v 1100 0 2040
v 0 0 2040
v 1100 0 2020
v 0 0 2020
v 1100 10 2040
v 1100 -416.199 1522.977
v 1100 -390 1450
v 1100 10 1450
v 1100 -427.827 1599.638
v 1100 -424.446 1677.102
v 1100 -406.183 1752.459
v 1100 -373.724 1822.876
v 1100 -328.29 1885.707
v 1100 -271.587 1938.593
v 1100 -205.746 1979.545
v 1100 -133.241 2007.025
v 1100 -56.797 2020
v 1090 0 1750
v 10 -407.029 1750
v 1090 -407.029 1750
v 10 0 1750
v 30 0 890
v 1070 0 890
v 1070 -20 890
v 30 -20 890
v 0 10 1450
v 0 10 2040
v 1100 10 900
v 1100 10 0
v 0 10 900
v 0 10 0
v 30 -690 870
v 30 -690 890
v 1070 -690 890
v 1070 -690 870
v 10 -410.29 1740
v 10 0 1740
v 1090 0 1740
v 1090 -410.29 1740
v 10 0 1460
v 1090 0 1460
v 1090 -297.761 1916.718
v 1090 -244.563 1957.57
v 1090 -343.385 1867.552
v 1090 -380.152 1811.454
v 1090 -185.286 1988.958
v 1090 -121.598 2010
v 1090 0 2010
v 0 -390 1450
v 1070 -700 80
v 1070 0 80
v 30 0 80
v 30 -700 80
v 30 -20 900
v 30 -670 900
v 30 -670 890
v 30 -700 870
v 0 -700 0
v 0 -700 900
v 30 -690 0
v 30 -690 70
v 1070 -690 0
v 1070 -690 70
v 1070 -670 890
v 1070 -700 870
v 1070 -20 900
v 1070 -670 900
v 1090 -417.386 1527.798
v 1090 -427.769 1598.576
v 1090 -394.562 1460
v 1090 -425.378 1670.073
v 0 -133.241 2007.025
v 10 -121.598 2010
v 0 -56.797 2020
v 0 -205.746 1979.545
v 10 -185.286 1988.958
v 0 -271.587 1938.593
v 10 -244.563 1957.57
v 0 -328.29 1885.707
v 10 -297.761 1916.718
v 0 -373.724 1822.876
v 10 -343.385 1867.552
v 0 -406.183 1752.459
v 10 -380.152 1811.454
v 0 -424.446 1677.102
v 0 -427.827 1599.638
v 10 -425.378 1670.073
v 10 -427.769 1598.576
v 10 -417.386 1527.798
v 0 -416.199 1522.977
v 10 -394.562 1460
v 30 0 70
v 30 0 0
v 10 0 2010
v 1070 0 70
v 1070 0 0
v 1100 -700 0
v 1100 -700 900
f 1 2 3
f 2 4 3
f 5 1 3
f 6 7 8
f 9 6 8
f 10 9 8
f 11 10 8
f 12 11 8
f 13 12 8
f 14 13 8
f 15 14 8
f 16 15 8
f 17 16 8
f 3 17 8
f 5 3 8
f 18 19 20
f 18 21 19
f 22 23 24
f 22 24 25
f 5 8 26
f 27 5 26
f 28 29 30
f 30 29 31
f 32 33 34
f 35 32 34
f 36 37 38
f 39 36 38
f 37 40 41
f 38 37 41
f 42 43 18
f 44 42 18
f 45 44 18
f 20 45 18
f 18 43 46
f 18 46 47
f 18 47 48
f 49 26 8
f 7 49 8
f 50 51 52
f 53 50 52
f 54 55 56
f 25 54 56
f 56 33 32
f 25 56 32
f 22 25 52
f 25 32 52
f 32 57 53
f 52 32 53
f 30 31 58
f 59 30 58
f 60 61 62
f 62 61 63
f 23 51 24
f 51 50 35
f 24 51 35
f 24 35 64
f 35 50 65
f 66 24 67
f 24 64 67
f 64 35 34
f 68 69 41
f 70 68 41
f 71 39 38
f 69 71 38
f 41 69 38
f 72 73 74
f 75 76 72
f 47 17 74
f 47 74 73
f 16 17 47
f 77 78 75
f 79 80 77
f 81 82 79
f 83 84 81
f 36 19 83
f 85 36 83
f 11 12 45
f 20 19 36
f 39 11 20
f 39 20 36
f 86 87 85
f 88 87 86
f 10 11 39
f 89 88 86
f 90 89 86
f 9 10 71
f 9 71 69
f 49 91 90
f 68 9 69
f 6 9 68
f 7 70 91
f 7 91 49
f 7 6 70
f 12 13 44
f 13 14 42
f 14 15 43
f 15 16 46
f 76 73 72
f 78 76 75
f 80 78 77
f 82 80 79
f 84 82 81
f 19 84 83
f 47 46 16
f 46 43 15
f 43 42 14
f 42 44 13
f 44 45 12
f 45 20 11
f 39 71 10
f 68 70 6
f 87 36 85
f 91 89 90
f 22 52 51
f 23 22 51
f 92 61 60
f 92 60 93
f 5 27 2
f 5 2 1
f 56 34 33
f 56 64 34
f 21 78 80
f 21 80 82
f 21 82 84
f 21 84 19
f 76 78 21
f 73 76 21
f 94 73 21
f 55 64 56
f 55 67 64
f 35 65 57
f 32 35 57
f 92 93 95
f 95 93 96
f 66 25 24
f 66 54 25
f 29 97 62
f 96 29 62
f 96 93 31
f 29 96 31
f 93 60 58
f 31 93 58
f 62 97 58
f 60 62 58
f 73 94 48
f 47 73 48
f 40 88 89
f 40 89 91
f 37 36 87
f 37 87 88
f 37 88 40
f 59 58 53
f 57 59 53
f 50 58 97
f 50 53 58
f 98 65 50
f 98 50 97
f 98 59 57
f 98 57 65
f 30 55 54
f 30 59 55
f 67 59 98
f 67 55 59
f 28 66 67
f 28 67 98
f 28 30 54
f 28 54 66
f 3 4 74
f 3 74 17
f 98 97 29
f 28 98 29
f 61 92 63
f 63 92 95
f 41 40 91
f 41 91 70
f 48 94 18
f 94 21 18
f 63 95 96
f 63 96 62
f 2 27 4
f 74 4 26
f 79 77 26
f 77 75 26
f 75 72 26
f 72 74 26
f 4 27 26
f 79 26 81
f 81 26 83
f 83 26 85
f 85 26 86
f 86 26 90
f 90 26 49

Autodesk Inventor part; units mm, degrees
sketch "Sketch1" plane through (0, 0, 0) normal (0, 0, 1) x (1, 0, 0)
  line L0 (0, 0) -> (1100, 0)
  line L1 (1100, 0) -> (1100, 10)
  line L2 (1100, 10) -> (0, 10)
  line L3 (0, 10) -> (0, 0)
  dimension "ancho" = 1100
  dimension "espesor" = 10
extrude "Extrusion1" add sketch "Sketch1" along normal blind 900
sketch "Sketch2" plane through (0, 0, 0) normal (0, -1, 0) x (1, 0, 0)
  line L0 (0, 0) -> (1100, 0) construction
  line L1 (1100, 0) -> (1100, 900) construction
  line L2 (0, 900) -> (1100, 900) construction
  line L3 (0, 0) -> (0, 900) construction
  line L4 (0, 0) -> (0, 900) projected
  line L5 (0, 70) -> (1100, 70)
  line L6 (1100, 70) -> (1100, 80)
  line L7 (1100, 80) -> (0, 80)
  line L8 (0, 80) -> (0, 70)
  line L9 (0, 900) -> (1100, 900) projected
  line L10 (1100, 0) -> (1100, 900) projected
  line L11 (0, 900) -> (1100, 900)
  line L12 (1100, 900) -> (1100, 890)
  line L13 (1100, 890) -> (0, 890)
  line L14 (0, 890) -> (0, 900)
  dimension "d5" = 10
  dimension "d6" = 10
  dimension "d7" = 80
extrude "Extrusion2" add sketch "Sketch2" along normal blind 700 contours L4 L7 L6 L5 | L4 L9 L10 L13
sketch "Sketch3" plane through (0, 0, 900) normal (0, 0, 1) x (1, 0, 0)
  line L0 (1100, 10) -> (1100, -700) projected
  line L1 (1100, 10) -> (0, 10) projected
  line L2 (0, 10) -> (0, -700) projected
  line L3 (1100, -700) -> (0, -700) projected
  line L4 (30, -670) -> (30, -20)
  line L5 (30, -20) -> (1070, -20)
  line L6 (1070, -20) -> (1070, -670)
  line L7 (1070, -670) -> (30, -670)
  point P0 (0, 0)
  dimension "d10" = 30
extrude "Extrusion3" cut sketch "Sketch3" against normal up to next contours L4 L5 L6 L7
sketch "Sketch4" plane through (0, -700, 0) normal (0, -1, 0) x (1, 0, 0)
  line L0 (0, 70) -> (1100, 70) construction
  line L1 (1100, 70) -> (1100, 80) construction
  line L2 (1100, 80) -> (0, 80) construction
  line L3 (0, 80) -> (0, 70) construction
  line L4 (0, 900) -> (0, 890) construction
  line L5 (0, 890) -> (1100, 890) construction
  line L6 (1100, 890) -> (1100, 900) construction
  line L7 (1100, 900) -> (0, 900) construction
  line L8 (1100, 70) -> (0, 70) construction
  line L9 (0, 0) -> (0, 70) construction
  line L10 (0, 0) -> (1100, 0) construction
  line L11 (1100, 0) -> (1100, 70) construction
  line L12 (0, 900) -> (1100, 900)
  line L13 (1100, 900) -> (1100, 0)
  line L14 (1100, 0) -> (0, 0)
  line L15 (0, 0) -> (0, 900)
  line L16 (1100, 80) -> (0, 80) projected
  line L17 (30, 80) -> (1070, 80)
  line L18 (1070, 80) -> (1070, 890)
  line L19 (1070, 890) -> (30, 890)
  line L20 (30, 890) -> (30, 80)
  dimension "d13" = 30
  dimension "d14" = 30
extrude "Extrusion4" add sketch "Sketch4" against normal blind 10 contours L12 L13 L16 L18 L19 L20 L15 | L16 L13 L14 L15
ref_plane "Work Plane1" through (0, 0, 1450) normal (0, 0, 1) x (1, 0, 0)
sketch "Sketch5" plane through (0, 0, 1450) normal (0, 0, 1) x (1, 0, 0)
  line L0 (1100, 10) -> (0, 10) projected
  line L1 (0, 10) -> (0, -700) projected
  line L2 (1100, 10) -> (1100, -700) projected
  line L3 (1100, -700) -> (0, -700) projected
  point P0 (0, 0)
extrude "Extrusion5" add sketch "Sketch5" along normal blind 10
sketch "Sketch6" plane through (0, 0, 1460) normal (0, 0, 1) x (1, 0, 0)
  line L0 (1100, 10) -> (0, 10) projected
  line L1 (0, 10) -> (0, -700) projected
  line L2 (0, -700) -> (1100, -700) projected
  line L3 (1100, -700) -> (1100, 10) projected
  line L4 (1100, -700) -> (0, -700) projected
  line L5 (1100, 0) -> (1100, -690) projected
  line L6 (0, -700) -> (1100, -700)
  line L7 (1100, -700) -> (1100, -690)
  line L8 (1100, -690) -> (0, -690)
  line L9 (0, -690) -> (0, -700)
  line L10 (0, 0) -> (0, -690) projected
  line L11 (1100, 10) -> (0, 10)
  line L12 (0, 10) -> (0, 0)
  line L13 (0, 0) -> (1100, 0)
  line L14 (1100, 0) -> (1100, 10)
  dimension "d20" = 10
  dimension "d21" = 10
extrude "Extrusion6" add sketch "Sketch6" along normal blind 580 contours L3 L13 L1 L0 | L3 L2 L1 L8
sketch "Sketch7" plane through (0, -700, 1450) normal (0, -1, 0) x (1, 0, 0)
  line L0 (1100, 0) -> (1100, 590) projected
  line L1 (0, 590) -> (1100, 590) projected
  line L2 (0, 0) -> (0, 590) projected
  line L3 (0, 10) -> (1100, 10) projected
  line L4 (30, 10) -> (1070, 10)
  line L5 (1070, 10) -> (1070, 560)
  line L6 (1070, 560) -> (30, 560)
  line L7 (30, 560) -> (30, 10)
  line L8 (0, 0) -> (1100, 0) projected
  point P0 (0, -1450)
  dimension "d24" = 30
  dimension "d25" = 30
  dimension "d26" = 30
extrude "Extrusion7" cut sketch "Sketch7" against normal up to next contours L3 L7 L6 L5
sketch "Sketch9" plane through (0, -700, 0) normal (0, -1, 0) x (1, 0, 0)
  line L0 (0, 900) -> (0, 0) construction
  line L1 (1100, 900) -> (1100, 0) construction
  line L2 (1100, 890) -> (1100, 80) projected
  line L3 (0, 900) -> (1100, 900)
  line L4 (1100, 900) -> (1100, 870)
  line L5 (1100, 870) -> (0, 870)
  line L6 (0, 870) -> (0, 900)
  line L7 (1100, 0) -> (0, 0) projected
  line L8 (1100, 900) -> (0, 900) projected
extrude "Extrusion9" add sketch "Sketch9" against normal blind 10
ref_plane "Work Plane2" through (0, 0, 1740) normal (0, 0, 1) x (1, 0, 0)
sketch "Sketch12" plane through (0, 0, 1740) normal (0, 0, 1) x (1, 0, 0)
  line L0 (1100, -690) -> (1100, 0) projected
  line L1 (1100, 0) -> (0, 0) projected
  line L2 (0, -690) -> (1100, -690) projected
  line L3 (0, -690) -> (0, 0) projected
  point P0 (0, 0)
extrude "Extrusion11" add sketch "Sketch12" along normal blind 10
sketch "Sketch14" plane through (1100, 0, 890) normal (0, 0, -1) x (-1, 0, 0)
  line L0 (0, 0) -> (0, -690) projected
  line L1 (0, 0) -> (30, 0)
  line L2 (30, 0) -> (30, -690)
  line L3 (30, -690) -> (0, -690)
  line L4 (0, -690) -> (0, 0)
  line L5 (0, -690) -> (1100, -690) projected
  line L6 (0, 0) -> (1100, 0) projected
  line L7 (1100, -690) -> (1070, -690)
  line L8 (1070, -690) -> (1070, 0)
  line L9 (1070, 0) -> (1100, 0)
  line L10 (1100, 0) -> (1100, -690)
extrude "Extrusion13" add sketch "Sketch14" along normal blind 890 contours L1 L2 L3 L0 | L6 L10 L5 L8
ref_plane "Work Plane3" through (0, 0, 2010) normal (0, 0, 1) x (1, 0, 0)
sketch "Sketch15" plane through (0, 0, 2010) normal (0, 0, 1) x (1, 0, 0)
  line L0 (0, -690) -> (0, -700) projected
  line L1 (0, -690) -> (1100, -690)
  line L2 (1100, -690) -> (1100, 0)
  line L3 (1100, 0) -> (0, 0)
  line L4 (0, 0) -> (0, -690)
  point P0 (0, 0)
extrude "Extrusion14" add sketch "Sketch15" along normal blind 10
sketch "Sketch16" plane through (0, 0, 2020) normal (0, 0, 1) x (1, 0, 0)
  line L0 (0, 10) -> (0, -700) projected
  line L1 (0, -700) -> (10, -700)
  line L2 (10, -700) -> (10, 10)
  line L3 (10, 10) -> (0, 10)
  line L4 (0, 10) -> (0, -700)
  line L5 (1100, -700) -> (0, -700) projected
  line L6 (1100, 10) -> (0, 10) projected
  line L7 (1100, -700) -> (1090, -700)
  line L8 (1090, -700) -> (1090, 10)
  line L9 (1090, 10) -> (1100, 10)
  line L10 (1100, 10) -> (1100, -700)
  point P0 (0, 0)
  dimension "d57" = 10
  dimension "d58" = 10
extrude "Extrusion15" add sketch "Sketch16" against normal up to surface (570 mm away) contours L3 L2 L1 L0 | L6 L10 L5 L8
sketch "Sketch17" plane through (1100, -700, 1450) normal (1, 0, 0) x (0, 0, -1)
  line L0 (-300, 10) -> (-300, 700) projected
  line L1 (0, 710) -> (-590, 710) projected
  line L2 (-590, 700) -> (-590, 710) projected
  line L3 (-570, 700) -> (-590, 700) projected
  line L4 (-570, 10) -> (-570, 700) projected
  line L5 (-570, 10) -> (-590, 10) projected
  line L6 (-590, 0) -> (-590, 10) projected
  line L7 (0, 0) -> (-590, 0) projected
  line L8 (0, 0) -> (0, 710) projected
  line L9 (0, 710) -> (0, 310)
  line L10 (0, 0) -> (0, 710) projected
  arc A0 (-570, 700) -> (0, 310) centre (-171.0094, 671.6017) ccw
  point P0 (1450, 700)
  dimension "d61" = 400
  dimension "d62" = 400
extrude "Extrusion16" cut sketch "Sketch17" against normal up to next contours L8 L7 L6 L5 L4 A0
equation "\"d5\" = espesor"
equation "\"d6\" = espesor"
equation "\"d10\" = 3 * espesor"
equation "\"d13\" = 3 * espesor"
equation "\"d14\" = 3 * espesor"
equation "\"d15\" = espesor"
equation "\"d18\" = espesor"
equation "\"d20\" = espesor"
equation "\"d21\" = espesor"
equation "\"d24\" = 3 * espesor"
equation "\"d25\" = 3 * espesor"
equation "\"d26\" = 3 * espesor"
equation "\"d33\" = espesor"
equation "\"d41\" = espesor"
equation "\"d47\" = h_inf - espesor"
equation "\"d55\" = espesor"
equation "\"d57\" = espesor"
equation "\"d58\" = espesor"
equation "\"d59\" = espesor"
equation "\"d63\" = espesor"
equation "\"h_inf\" = 900"
properties part number "esqueleto_mueble" material "Lead"
